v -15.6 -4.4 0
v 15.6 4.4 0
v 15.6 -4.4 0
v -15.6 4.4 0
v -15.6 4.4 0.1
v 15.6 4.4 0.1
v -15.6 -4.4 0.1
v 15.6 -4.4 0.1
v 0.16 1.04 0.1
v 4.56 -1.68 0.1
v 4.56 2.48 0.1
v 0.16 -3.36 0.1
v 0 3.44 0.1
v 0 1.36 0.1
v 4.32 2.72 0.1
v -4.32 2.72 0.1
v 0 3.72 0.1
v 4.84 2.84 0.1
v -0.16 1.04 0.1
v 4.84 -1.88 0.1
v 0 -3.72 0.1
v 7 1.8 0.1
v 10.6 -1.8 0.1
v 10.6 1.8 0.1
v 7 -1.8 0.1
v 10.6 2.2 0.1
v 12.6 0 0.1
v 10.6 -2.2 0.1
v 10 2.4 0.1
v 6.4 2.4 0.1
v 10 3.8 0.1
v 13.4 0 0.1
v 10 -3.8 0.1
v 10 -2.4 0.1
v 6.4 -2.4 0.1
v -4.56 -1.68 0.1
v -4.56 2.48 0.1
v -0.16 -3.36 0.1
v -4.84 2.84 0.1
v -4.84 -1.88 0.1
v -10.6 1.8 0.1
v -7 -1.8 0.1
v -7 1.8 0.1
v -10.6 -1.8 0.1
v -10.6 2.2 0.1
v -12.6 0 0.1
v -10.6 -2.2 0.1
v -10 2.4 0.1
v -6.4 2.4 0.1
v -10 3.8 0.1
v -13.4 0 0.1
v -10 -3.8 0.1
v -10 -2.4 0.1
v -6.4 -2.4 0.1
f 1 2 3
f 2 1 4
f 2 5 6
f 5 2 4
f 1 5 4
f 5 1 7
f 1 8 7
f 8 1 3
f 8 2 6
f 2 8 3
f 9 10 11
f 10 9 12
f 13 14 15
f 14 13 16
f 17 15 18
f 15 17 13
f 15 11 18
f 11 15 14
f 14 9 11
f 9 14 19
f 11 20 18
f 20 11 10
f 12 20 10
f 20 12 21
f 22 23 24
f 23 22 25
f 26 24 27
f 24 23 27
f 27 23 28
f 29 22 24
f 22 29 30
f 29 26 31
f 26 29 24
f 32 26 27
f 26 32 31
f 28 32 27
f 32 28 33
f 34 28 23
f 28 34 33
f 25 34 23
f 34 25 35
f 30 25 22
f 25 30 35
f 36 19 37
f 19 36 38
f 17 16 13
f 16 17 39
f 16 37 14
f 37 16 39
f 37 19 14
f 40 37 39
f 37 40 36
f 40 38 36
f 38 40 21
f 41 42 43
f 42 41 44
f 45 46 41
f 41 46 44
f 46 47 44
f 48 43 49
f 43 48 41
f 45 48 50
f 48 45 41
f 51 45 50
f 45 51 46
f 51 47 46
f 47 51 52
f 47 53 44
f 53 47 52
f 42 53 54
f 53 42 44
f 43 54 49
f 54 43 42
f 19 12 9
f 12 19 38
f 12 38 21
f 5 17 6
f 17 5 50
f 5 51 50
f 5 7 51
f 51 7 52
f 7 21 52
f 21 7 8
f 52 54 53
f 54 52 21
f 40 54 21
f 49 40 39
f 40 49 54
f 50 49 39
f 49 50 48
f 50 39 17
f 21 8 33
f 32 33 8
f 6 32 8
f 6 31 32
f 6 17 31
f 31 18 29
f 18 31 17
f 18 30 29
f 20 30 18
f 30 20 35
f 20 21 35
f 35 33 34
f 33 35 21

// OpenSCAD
// file: ../p/box5-12.scad
use <../lib.scad>
function ldraw_lib__box5_12() = [
// 0 Box with 5 Faces without Any Edges
// 0 Name: box5-12.dat
// 0 Author: Chris Dee [cwdee]
// 0 !LDRAW_ORG Primitive UPDATE 2009-02
// 0 !LICENSE Licensed under CC BY 4.0 : see CAreadme.txt
// 
// 0 BFC CERTIFY CCW
  [0,"BFC","CERTIFY"],
  [0,"BFC","CCW"],
// 
// 0 !HISTORY 2009-09-03 [PTadmin] Official Update 2009-02
// 
// 
// 4 16 1 1 1 1 1 -1 -1 1 -1 -1 1 1
  [4,16,1,1,1,1,1,-1,-1,1,-1,-1,1,1],
// 4 16 -1 0 1 1 0 1 1 1 1 -1 1 1
  [4,16,-1,0,1,1,0,1,1,1,1,-1,1,1],
// 4 16 -1 0 -1 -1 0 1 -1 1 1 -1 1 -1
  [4,16,-1,0,-1,-1,0,1,-1,1,1,-1,1,-1],
// 4 16 1 0 -1 -1 0 -1 -1 1 -1 1 1 -1
  [4,16,1,0,-1,-1,0,-1,-1,1,-1,1,1,-1],
// 4 16 1 0 1 1 0 -1 1 1 -1 1 1 1
  [4,16,1,0,1,1,0,-1,1,1,-1,1,1,1],
// 0
];
module ldraw_lib__box5_12(step=0, col=false, unit=2/5, alt=false, line=0.2, solid=!$preview)
    makepoly(ldraw_lib__box5_12(), step=step, col=col, unit=unit, alt=alt, line=line, solid=solid);
ldraw_lib__box5_12(line=0.2);
// main file
use <../lib.scad>
use <../p/box5-12.scad>
function ldraw_lib__195645b() = [
// 0 Sticker  1.1 x  3.9 with Small Box and Arrows
// 0 Name: 195645b.dat
// 0 Author: Takeshi Takahashi [RainbowDolphin]
// 0 !LDRAW_ORG Part UPDATE 2025-03
// 0 !LICENSE Licensed under CC BY 4.0 : see CAreadme.txt
// 
// 0 BFC CERTIFY CCW
  [0,"BFC","CERTIFY"],
  [0,"BFC","CCW"],
// 
// 0 !KEYWORDS Bricklink 6391stk01, Brickowl 195645, Cargo, helicopter, Parcel
// 0 !KEYWORDS Rebrickable 195645, Set 6391
// 
// 0 !HISTORY 2025-03-30 [OrionP] Official Update 2025-03
// 
// 1 16 0 -0.25 0 39 0 0 0 0.25 0 0 0 11 box5-12.dat
  [1,16,0,-0.25,0,39,0,0,0,0.25,0,0,0,11, ldraw_lib__box5_12()],
// 4 14 0.4 -0.25 2.6 0.4 -0.25 -8.4 11.4 -0.25 -4.2 11.4 -0.25 6.2
  [4,14,0.4,-0.25,2.6,0.4,-0.25,-8.4,11.4,-0.25,-4.2,11.4,-0.25,6.2],
// 4 14 0 -0.25 3.4 10.8 -0.25 6.8 0 -0.25 8.6 -10.8 -0.25 6.8
  [4,14,0,-0.25,3.4,10.8,-0.25,6.8,0,-0.25,8.6,-10.8,-0.25,6.8],
// 4 0 0 -0.25 9.3 0 -0.25 8.6 10.8 -0.25 6.8 12.1 -0.25 7.1
  [4,0,0,-0.25,9.3,0,-0.25,8.6,10.8,-0.25,6.8,12.1,-0.25,7.1],
// 4 0 11.4 -0.25 6.2 12.1 -0.25 7.1 10.8 -0.25 6.8 0 -0.25 3.4
  [4,0,11.4,-0.25,6.2,12.1,-0.25,7.1,10.8,-0.25,6.8,0,-0.25,3.4],
// 4 0 0.4 -0.25 2.6 11.4 -0.25 6.2 0 -0.25 3.4 -0.4 -0.25 2.6
  [4,0,0.4,-0.25,2.6,11.4,-0.25,6.2,0,-0.25,3.4,-0.4,-0.25,2.6],
// 4 0 12.1 -0.25 7.1 11.4 -0.25 6.2 11.4 -0.25 -4.2 12.1 -0.25 -4.7
  [4,0,12.1,-0.25,7.1,11.4,-0.25,6.2,11.4,-0.25,-4.2,12.1,-0.25,-4.7],
// 4 0 12.1 -0.25 -4.7 11.4 -0.25 -4.2 0.4 -0.25 -8.4 0 -0.25 -9.3
  [4,0,12.1,-0.25,-4.7,11.4,-0.25,-4.2,0.4,-0.25,-8.4,0,-0.25,-9.3],
// 4 14 26.5 -.25 4.5 17.5 -.25 4.5 17.5 -.25 -4.5 26.5 -.25 -4.5
  [4,14,26.5,-.25,4.5,17.5,-.25,4.5,17.5,-.25,-4.5,26.5,-.25,-4.5],
// 3 14 26.5 -.25 5.5 26.5 -.25 4.5 31.5 -.25 0
  [3,14,26.5,-.25,5.5,26.5,-.25,4.5,31.5,-.25,0],
// 3 14 26.5 -.25 4.5 26.5 -.25 -4.5 31.5 -.25 0
  [3,14,26.5,-.25,4.5,26.5,-.25,-4.5,31.5,-.25,0],
// 3 14 31.5 -.25 0 26.5 -.25 -4.5 26.5 -.25 -5.5
  [3,14,31.5,-.25,0,26.5,-.25,-4.5,26.5,-.25,-5.5],
// 4 0 16 -.25 6 17.5 -.25 4.5 26.5 -.25 4.5 25 -.25 6
  [4,0,16,-.25,6,17.5,-.25,4.5,26.5,-.25,4.5,25,-.25,6],
// 4 0 25 -.25 6 26.5 -.25 4.5 26.5 -.25 5.5 25 -.25 9.5
  [4,0,25,-.25,6,26.5,-.25,4.5,26.5,-.25,5.5,25,-.25,9.5],
// 4 0 33.5 -.25 0 25 -.25 9.5 26.5 -.25 5.5 31.5 -.25 0
  [4,0,33.5,-.25,0,25,-.25,9.5,26.5,-.25,5.5,31.5,-.25,0],
// 4 0 33.5 -.25 0 31.5 -.25 0 26.5 -.25 -5.5 25 -.25 -9.5
  [4,0,33.5,-.25,0,31.5,-.25,0,26.5,-.25,-5.5,25,-.25,-9.5],
// 4 0 25 -.25 -6 25 -.25 -9.5 26.5 -.25 -5.5 26.5 -.25 -4.5
  [4,0,25,-.25,-6,25,-.25,-9.5,26.5,-.25,-5.5,26.5,-.25,-4.5],
// 4 0 25 -.25 -6 26.5 -.25 -4.5 17.5 -.25 -4.5 16 -.25 -6
  [4,0,25,-.25,-6,26.5,-.25,-4.5,17.5,-.25,-4.5,16,-.25,-6],
// 4 0 16 -.25 -6 17.5 -.25 -4.5 17.5 -.25 4.5 16 -.25 6
  [4,0,16,-.25,-6,17.5,-.25,-4.5,17.5,-.25,4.5,16,-.25,6],
// 4 14 -11.4 -0.25 -4.2 -0.4 -0.25 -8.4 -0.4 -0.25 2.6 -11.4 -0.25 6.2
  [4,14,-11.4,-0.25,-4.2,-0.4,-0.25,-8.4,-0.4,-0.25,2.6,-11.4,-0.25,6.2],
// 4 0 -10.8 -0.25 6.8 0 -0.25 8.6 0 -0.25 9.3 -12.1 -0.25 7.1
  [4,0,-10.8,-0.25,6.8,0,-0.25,8.6,0,-0.25,9.3,-12.1,-0.25,7.1],
// 4 0 -10.8 -0.25 6.8 -12.1 -0.25 7.1 -11.4 -0.25 6.2 0 -0.25 3.4
  [4,0,-10.8,-0.25,6.8,-12.1,-0.25,7.1,-11.4,-0.25,6.2,0,-0.25,3.4],
// 3 0 -11.4 -0.25 6.2 -0.4 -0.25 2.6 0 -0.25 3.4
  [3,0,-11.4,-0.25,6.2,-0.4,-0.25,2.6,0,-0.25,3.4],
// 4 0 -11.4 -0.25 -4.2 -11.4 -0.25 6.2 -12.1 -0.25 7.1 -12.1 -0.25 -4.7
  [4,0,-11.4,-0.25,-4.2,-11.4,-0.25,6.2,-12.1,-0.25,7.1,-12.1,-0.25,-4.7],
// 4 0 -0.4 -0.25 -8.4 -11.4 -0.25 -4.2 -12.1 -0.25 -4.7 0 -0.25 -9.3
  [4,0,-0.4,-0.25,-8.4,-11.4,-0.25,-4.2,-12.1,-0.25,-4.7,0,-0.25,-9.3],
// 4 14 -17.5 -.25 -4.5 -17.5 -.25 4.5 -26.5 -.25 4.5 -26.5 -.25 -4.5
  [4,14,-17.5,-.25,-4.5,-17.5,-.25,4.5,-26.5,-.25,4.5,-26.5,-.25,-4.5],
// 3 14 -26.5 -.25 5.5 -31.5 -.25 0 -26.5 -.25 4.5
  [3,14,-26.5,-.25,5.5,-31.5,-.25,0,-26.5,-.25,4.5],
// 3 14 -26.5 -.25 4.5 -31.5 -.25 0 -26.5 -.25 -4.5
  [3,14,-26.5,-.25,4.5,-31.5,-.25,0,-26.5,-.25,-4.5],
// 3 14 -31.5 -.25 0 -26.5 -.25 -5.5 -26.5 -.25 -4.5
  [3,14,-31.5,-.25,0,-26.5,-.25,-5.5,-26.5,-.25,-4.5],
// 4 0 -26.5 -.25 4.5 -17.5 -.25 4.5 -16 -.25 6 -25 -.25 6
  [4,0,-26.5,-.25,4.5,-17.5,-.25,4.5,-16,-.25,6,-25,-.25,6],
// 4 0 -26.5 -.25 5.5 -26.5 -.25 4.5 -25 -.25 6 -25 -.25 9.5
  [4,0,-26.5,-.25,5.5,-26.5,-.25,4.5,-25,-.25,6,-25,-.25,9.5],
// 4 0 -26.5 -.25 5.5 -25 -.25 9.5 -33.5 -.25 0 -31.5 -.25 0
  [4,0,-26.5,-.25,5.5,-25,-.25,9.5,-33.5,-.25,0,-31.5,-.25,0],
// 4 0 -26.5 -.25 -5.5 -31.5 -.25 0 -33.5 -.25 0 -25 -.25 -9.5
  [4,0,-26.5,-.25,-5.5,-31.5,-.25,0,-33.5,-.25,0,-25,-.25,-9.5],
// 4 0 -26.5 -.25 -5.5 -25 -.25 -9.5 -25 -.25 -6 -26.5 -.25 -4.5
  [4,0,-26.5,-.25,-5.5,-25,-.25,-9.5,-25,-.25,-6,-26.5,-.25,-4.5],
// 4 0 -17.5 -.25 -4.5 -26.5 -.25 -4.5 -25 -.25 -6 -16 -.25 -6
  [4,0,-17.5,-.25,-4.5,-26.5,-.25,-4.5,-25,-.25,-6,-16,-.25,-6],
// 4 0 -17.5 -.25 4.5 -17.5 -.25 -4.5 -16 -.25 -6 -16 -.25 6
  [4,0,-17.5,-.25,4.5,-17.5,-.25,-4.5,-16,-.25,-6,-16,-.25,6],
// 4 0 0.4 -0.25 2.6 -0.4 -0.25 2.6 -0.4 -0.25 -8.4 0.4 -0.25 -8.4
  [4,0,0.4,-0.25,2.6,-0.4,-0.25,2.6,-0.4,-0.25,-8.4,0.4,-0.25,-8.4],
// 3 0 0.4 -0.25 -8.4 -0.4 -0.25 -8.4 0 -0.25 -9.3
  [3,0,0.4,-0.25,-8.4,-0.4,-0.25,-8.4,0,-0.25,-9.3],
// 4 15 0 -0.25 9.3 39 -0.25 11 -39 -0.25 11 -25 -0.25 9.5
  [4,15,0,-0.25,9.3,39,-0.25,11,-39,-0.25,11,-25,-0.25,9.5],
// 3 15 -39 -0.25 11 -33.5 -0.25 0 -25 -0.25 9.5
  [3,15,-39,-0.25,11,-33.5,-0.25,0,-25,-0.25,9.5],
// 3 15 -39 -0.25 11 -39 -0.25 -11 -33.5 -0.25 0
  [3,15,-39,-0.25,11,-39,-0.25,-11,-33.5,-0.25,0],
// 3 15 -33.5 -0.25 0 -39 -0.25 -11 -25 -0.25 -9.5
  [3,15,-33.5,-0.25,0,-39,-0.25,-11,-25,-0.25,-9.5],
// 4 15 0 -0.25 -9.3 -25 -0.25 -9.5 -39 -0.25 -11 39 -0.25 -11
  [4,15,0,-0.25,-9.3,-25,-0.25,-9.5,-39,-0.25,-11,39,-0.25,-11],
// 4 15 -25 -0.25 -6 -25 -0.25 -9.5 0 -0.25 -9.3 -16 -0.25 -6
  [4,15,-25,-0.25,-6,-25,-0.25,-9.5,0,-0.25,-9.3,-16,-0.25,-6],
// 3 15 -12.1 -0.25 -4.7 -16 -0.25 -6 0 -0.25 -9.3
  [3,15,-12.1,-0.25,-4.7,-16,-0.25,-6,0,-0.25,-9.3],
// 4 15 -16 -0.25 6 -16 -0.25 -6 -12.1 -0.25 -4.7 -12.1 -0.25 7.1
  [4,15,-16,-0.25,6,-16,-0.25,-6,-12.1,-0.25,-4.7,-12.1,-0.25,7.1],
// 4 15 -25 -0.25 6 -16 -0.25 6 -12.1 -0.25 7.1 -25 -0.25 9.5
  [4,15,-25,-0.25,6,-16,-0.25,6,-12.1,-0.25,7.1,-25,-0.25,9.5],
// 3 15 -25 -0.25 9.5 -12.1 -0.25 7.1 0 -0.25 9.3
  [3,15,-25,-0.25,9.5,-12.1,-0.25,7.1,0,-0.25,9.3],
// 3 15 0 -0.25 -9.3 39 -0.25 -11 25 -0.25 -9.5
  [3,15,0,-0.25,-9.3,39,-0.25,-11,25,-0.25,-9.5],
// 3 15 33.5 -0.25 0 25 -0.25 -9.5 39 -0.25 -11
  [3,15,33.5,-0.25,0,25,-0.25,-9.5,39,-0.25,-11],
// 3 15 39 -0.25 11 33.5 -0.25 0 39 -0.25 -11
  [3,15,39,-0.25,11,33.5,-0.25,0,39,-0.25,-11],
// 3 15 39 -0.25 11 25 -0.25 9.5 33.5 -0.25 0
  [3,15,39,-0.25,11,25,-0.25,9.5,33.5,-0.25,0],
// 3 15 39 -0.25 11 0 -0.25 9.3 25 -0.25 9.5
  [3,15,39,-0.25,11,0,-0.25,9.3,25,-0.25,9.5],
// 4 15 25 -0.25 9.5 0 -0.25 9.3 12.1 -0.25 7.1 25 -0.25 6
  [4,15,25,-0.25,9.5,0,-0.25,9.3,12.1,-0.25,7.1,25,-0.25,6],
// 3 15 12.1 -0.25 7.1 16 -0.25 6 25 -0.25 6
  [3,15,12.1,-0.25,7.1,16,-0.25,6,25,-0.25,6],
// 4 15 16 -0.25 6 12.1 -0.25 7.1 12.1 -0.25 -4.7 16 -0.25 -6
  [4,15,16,-0.25,6,12.1,-0.25,7.1,12.1,-0.25,-4.7,16,-0.25,-6],
// 3 15 12.1 -0.25 -4.7 0 -0.25 -9.3 16 -0.25 -6
  [3,15,12.1,-0.25,-4.7,0,-0.25,-9.3,16,-0.25,-6],
// 4 15 25 -0.25 -6 16 -0.25 -6 0 -0.25 -9.3 25 -0.25 -9.5
  [4,15,25,-0.25,-6,16,-0.25,-6,0,-0.25,-9.3,25,-0.25,-9.5],
];
module ldraw_lib__195645b(step=0, col=false, unit=2/5, alt=false, line=0.2, solid=!$preview)
    makepoly(ldraw_lib__195645b(), step=step, col=col, unit=unit, alt=alt, line=line, solid=solid);
ldraw_lib__195645b(line=0.2);
